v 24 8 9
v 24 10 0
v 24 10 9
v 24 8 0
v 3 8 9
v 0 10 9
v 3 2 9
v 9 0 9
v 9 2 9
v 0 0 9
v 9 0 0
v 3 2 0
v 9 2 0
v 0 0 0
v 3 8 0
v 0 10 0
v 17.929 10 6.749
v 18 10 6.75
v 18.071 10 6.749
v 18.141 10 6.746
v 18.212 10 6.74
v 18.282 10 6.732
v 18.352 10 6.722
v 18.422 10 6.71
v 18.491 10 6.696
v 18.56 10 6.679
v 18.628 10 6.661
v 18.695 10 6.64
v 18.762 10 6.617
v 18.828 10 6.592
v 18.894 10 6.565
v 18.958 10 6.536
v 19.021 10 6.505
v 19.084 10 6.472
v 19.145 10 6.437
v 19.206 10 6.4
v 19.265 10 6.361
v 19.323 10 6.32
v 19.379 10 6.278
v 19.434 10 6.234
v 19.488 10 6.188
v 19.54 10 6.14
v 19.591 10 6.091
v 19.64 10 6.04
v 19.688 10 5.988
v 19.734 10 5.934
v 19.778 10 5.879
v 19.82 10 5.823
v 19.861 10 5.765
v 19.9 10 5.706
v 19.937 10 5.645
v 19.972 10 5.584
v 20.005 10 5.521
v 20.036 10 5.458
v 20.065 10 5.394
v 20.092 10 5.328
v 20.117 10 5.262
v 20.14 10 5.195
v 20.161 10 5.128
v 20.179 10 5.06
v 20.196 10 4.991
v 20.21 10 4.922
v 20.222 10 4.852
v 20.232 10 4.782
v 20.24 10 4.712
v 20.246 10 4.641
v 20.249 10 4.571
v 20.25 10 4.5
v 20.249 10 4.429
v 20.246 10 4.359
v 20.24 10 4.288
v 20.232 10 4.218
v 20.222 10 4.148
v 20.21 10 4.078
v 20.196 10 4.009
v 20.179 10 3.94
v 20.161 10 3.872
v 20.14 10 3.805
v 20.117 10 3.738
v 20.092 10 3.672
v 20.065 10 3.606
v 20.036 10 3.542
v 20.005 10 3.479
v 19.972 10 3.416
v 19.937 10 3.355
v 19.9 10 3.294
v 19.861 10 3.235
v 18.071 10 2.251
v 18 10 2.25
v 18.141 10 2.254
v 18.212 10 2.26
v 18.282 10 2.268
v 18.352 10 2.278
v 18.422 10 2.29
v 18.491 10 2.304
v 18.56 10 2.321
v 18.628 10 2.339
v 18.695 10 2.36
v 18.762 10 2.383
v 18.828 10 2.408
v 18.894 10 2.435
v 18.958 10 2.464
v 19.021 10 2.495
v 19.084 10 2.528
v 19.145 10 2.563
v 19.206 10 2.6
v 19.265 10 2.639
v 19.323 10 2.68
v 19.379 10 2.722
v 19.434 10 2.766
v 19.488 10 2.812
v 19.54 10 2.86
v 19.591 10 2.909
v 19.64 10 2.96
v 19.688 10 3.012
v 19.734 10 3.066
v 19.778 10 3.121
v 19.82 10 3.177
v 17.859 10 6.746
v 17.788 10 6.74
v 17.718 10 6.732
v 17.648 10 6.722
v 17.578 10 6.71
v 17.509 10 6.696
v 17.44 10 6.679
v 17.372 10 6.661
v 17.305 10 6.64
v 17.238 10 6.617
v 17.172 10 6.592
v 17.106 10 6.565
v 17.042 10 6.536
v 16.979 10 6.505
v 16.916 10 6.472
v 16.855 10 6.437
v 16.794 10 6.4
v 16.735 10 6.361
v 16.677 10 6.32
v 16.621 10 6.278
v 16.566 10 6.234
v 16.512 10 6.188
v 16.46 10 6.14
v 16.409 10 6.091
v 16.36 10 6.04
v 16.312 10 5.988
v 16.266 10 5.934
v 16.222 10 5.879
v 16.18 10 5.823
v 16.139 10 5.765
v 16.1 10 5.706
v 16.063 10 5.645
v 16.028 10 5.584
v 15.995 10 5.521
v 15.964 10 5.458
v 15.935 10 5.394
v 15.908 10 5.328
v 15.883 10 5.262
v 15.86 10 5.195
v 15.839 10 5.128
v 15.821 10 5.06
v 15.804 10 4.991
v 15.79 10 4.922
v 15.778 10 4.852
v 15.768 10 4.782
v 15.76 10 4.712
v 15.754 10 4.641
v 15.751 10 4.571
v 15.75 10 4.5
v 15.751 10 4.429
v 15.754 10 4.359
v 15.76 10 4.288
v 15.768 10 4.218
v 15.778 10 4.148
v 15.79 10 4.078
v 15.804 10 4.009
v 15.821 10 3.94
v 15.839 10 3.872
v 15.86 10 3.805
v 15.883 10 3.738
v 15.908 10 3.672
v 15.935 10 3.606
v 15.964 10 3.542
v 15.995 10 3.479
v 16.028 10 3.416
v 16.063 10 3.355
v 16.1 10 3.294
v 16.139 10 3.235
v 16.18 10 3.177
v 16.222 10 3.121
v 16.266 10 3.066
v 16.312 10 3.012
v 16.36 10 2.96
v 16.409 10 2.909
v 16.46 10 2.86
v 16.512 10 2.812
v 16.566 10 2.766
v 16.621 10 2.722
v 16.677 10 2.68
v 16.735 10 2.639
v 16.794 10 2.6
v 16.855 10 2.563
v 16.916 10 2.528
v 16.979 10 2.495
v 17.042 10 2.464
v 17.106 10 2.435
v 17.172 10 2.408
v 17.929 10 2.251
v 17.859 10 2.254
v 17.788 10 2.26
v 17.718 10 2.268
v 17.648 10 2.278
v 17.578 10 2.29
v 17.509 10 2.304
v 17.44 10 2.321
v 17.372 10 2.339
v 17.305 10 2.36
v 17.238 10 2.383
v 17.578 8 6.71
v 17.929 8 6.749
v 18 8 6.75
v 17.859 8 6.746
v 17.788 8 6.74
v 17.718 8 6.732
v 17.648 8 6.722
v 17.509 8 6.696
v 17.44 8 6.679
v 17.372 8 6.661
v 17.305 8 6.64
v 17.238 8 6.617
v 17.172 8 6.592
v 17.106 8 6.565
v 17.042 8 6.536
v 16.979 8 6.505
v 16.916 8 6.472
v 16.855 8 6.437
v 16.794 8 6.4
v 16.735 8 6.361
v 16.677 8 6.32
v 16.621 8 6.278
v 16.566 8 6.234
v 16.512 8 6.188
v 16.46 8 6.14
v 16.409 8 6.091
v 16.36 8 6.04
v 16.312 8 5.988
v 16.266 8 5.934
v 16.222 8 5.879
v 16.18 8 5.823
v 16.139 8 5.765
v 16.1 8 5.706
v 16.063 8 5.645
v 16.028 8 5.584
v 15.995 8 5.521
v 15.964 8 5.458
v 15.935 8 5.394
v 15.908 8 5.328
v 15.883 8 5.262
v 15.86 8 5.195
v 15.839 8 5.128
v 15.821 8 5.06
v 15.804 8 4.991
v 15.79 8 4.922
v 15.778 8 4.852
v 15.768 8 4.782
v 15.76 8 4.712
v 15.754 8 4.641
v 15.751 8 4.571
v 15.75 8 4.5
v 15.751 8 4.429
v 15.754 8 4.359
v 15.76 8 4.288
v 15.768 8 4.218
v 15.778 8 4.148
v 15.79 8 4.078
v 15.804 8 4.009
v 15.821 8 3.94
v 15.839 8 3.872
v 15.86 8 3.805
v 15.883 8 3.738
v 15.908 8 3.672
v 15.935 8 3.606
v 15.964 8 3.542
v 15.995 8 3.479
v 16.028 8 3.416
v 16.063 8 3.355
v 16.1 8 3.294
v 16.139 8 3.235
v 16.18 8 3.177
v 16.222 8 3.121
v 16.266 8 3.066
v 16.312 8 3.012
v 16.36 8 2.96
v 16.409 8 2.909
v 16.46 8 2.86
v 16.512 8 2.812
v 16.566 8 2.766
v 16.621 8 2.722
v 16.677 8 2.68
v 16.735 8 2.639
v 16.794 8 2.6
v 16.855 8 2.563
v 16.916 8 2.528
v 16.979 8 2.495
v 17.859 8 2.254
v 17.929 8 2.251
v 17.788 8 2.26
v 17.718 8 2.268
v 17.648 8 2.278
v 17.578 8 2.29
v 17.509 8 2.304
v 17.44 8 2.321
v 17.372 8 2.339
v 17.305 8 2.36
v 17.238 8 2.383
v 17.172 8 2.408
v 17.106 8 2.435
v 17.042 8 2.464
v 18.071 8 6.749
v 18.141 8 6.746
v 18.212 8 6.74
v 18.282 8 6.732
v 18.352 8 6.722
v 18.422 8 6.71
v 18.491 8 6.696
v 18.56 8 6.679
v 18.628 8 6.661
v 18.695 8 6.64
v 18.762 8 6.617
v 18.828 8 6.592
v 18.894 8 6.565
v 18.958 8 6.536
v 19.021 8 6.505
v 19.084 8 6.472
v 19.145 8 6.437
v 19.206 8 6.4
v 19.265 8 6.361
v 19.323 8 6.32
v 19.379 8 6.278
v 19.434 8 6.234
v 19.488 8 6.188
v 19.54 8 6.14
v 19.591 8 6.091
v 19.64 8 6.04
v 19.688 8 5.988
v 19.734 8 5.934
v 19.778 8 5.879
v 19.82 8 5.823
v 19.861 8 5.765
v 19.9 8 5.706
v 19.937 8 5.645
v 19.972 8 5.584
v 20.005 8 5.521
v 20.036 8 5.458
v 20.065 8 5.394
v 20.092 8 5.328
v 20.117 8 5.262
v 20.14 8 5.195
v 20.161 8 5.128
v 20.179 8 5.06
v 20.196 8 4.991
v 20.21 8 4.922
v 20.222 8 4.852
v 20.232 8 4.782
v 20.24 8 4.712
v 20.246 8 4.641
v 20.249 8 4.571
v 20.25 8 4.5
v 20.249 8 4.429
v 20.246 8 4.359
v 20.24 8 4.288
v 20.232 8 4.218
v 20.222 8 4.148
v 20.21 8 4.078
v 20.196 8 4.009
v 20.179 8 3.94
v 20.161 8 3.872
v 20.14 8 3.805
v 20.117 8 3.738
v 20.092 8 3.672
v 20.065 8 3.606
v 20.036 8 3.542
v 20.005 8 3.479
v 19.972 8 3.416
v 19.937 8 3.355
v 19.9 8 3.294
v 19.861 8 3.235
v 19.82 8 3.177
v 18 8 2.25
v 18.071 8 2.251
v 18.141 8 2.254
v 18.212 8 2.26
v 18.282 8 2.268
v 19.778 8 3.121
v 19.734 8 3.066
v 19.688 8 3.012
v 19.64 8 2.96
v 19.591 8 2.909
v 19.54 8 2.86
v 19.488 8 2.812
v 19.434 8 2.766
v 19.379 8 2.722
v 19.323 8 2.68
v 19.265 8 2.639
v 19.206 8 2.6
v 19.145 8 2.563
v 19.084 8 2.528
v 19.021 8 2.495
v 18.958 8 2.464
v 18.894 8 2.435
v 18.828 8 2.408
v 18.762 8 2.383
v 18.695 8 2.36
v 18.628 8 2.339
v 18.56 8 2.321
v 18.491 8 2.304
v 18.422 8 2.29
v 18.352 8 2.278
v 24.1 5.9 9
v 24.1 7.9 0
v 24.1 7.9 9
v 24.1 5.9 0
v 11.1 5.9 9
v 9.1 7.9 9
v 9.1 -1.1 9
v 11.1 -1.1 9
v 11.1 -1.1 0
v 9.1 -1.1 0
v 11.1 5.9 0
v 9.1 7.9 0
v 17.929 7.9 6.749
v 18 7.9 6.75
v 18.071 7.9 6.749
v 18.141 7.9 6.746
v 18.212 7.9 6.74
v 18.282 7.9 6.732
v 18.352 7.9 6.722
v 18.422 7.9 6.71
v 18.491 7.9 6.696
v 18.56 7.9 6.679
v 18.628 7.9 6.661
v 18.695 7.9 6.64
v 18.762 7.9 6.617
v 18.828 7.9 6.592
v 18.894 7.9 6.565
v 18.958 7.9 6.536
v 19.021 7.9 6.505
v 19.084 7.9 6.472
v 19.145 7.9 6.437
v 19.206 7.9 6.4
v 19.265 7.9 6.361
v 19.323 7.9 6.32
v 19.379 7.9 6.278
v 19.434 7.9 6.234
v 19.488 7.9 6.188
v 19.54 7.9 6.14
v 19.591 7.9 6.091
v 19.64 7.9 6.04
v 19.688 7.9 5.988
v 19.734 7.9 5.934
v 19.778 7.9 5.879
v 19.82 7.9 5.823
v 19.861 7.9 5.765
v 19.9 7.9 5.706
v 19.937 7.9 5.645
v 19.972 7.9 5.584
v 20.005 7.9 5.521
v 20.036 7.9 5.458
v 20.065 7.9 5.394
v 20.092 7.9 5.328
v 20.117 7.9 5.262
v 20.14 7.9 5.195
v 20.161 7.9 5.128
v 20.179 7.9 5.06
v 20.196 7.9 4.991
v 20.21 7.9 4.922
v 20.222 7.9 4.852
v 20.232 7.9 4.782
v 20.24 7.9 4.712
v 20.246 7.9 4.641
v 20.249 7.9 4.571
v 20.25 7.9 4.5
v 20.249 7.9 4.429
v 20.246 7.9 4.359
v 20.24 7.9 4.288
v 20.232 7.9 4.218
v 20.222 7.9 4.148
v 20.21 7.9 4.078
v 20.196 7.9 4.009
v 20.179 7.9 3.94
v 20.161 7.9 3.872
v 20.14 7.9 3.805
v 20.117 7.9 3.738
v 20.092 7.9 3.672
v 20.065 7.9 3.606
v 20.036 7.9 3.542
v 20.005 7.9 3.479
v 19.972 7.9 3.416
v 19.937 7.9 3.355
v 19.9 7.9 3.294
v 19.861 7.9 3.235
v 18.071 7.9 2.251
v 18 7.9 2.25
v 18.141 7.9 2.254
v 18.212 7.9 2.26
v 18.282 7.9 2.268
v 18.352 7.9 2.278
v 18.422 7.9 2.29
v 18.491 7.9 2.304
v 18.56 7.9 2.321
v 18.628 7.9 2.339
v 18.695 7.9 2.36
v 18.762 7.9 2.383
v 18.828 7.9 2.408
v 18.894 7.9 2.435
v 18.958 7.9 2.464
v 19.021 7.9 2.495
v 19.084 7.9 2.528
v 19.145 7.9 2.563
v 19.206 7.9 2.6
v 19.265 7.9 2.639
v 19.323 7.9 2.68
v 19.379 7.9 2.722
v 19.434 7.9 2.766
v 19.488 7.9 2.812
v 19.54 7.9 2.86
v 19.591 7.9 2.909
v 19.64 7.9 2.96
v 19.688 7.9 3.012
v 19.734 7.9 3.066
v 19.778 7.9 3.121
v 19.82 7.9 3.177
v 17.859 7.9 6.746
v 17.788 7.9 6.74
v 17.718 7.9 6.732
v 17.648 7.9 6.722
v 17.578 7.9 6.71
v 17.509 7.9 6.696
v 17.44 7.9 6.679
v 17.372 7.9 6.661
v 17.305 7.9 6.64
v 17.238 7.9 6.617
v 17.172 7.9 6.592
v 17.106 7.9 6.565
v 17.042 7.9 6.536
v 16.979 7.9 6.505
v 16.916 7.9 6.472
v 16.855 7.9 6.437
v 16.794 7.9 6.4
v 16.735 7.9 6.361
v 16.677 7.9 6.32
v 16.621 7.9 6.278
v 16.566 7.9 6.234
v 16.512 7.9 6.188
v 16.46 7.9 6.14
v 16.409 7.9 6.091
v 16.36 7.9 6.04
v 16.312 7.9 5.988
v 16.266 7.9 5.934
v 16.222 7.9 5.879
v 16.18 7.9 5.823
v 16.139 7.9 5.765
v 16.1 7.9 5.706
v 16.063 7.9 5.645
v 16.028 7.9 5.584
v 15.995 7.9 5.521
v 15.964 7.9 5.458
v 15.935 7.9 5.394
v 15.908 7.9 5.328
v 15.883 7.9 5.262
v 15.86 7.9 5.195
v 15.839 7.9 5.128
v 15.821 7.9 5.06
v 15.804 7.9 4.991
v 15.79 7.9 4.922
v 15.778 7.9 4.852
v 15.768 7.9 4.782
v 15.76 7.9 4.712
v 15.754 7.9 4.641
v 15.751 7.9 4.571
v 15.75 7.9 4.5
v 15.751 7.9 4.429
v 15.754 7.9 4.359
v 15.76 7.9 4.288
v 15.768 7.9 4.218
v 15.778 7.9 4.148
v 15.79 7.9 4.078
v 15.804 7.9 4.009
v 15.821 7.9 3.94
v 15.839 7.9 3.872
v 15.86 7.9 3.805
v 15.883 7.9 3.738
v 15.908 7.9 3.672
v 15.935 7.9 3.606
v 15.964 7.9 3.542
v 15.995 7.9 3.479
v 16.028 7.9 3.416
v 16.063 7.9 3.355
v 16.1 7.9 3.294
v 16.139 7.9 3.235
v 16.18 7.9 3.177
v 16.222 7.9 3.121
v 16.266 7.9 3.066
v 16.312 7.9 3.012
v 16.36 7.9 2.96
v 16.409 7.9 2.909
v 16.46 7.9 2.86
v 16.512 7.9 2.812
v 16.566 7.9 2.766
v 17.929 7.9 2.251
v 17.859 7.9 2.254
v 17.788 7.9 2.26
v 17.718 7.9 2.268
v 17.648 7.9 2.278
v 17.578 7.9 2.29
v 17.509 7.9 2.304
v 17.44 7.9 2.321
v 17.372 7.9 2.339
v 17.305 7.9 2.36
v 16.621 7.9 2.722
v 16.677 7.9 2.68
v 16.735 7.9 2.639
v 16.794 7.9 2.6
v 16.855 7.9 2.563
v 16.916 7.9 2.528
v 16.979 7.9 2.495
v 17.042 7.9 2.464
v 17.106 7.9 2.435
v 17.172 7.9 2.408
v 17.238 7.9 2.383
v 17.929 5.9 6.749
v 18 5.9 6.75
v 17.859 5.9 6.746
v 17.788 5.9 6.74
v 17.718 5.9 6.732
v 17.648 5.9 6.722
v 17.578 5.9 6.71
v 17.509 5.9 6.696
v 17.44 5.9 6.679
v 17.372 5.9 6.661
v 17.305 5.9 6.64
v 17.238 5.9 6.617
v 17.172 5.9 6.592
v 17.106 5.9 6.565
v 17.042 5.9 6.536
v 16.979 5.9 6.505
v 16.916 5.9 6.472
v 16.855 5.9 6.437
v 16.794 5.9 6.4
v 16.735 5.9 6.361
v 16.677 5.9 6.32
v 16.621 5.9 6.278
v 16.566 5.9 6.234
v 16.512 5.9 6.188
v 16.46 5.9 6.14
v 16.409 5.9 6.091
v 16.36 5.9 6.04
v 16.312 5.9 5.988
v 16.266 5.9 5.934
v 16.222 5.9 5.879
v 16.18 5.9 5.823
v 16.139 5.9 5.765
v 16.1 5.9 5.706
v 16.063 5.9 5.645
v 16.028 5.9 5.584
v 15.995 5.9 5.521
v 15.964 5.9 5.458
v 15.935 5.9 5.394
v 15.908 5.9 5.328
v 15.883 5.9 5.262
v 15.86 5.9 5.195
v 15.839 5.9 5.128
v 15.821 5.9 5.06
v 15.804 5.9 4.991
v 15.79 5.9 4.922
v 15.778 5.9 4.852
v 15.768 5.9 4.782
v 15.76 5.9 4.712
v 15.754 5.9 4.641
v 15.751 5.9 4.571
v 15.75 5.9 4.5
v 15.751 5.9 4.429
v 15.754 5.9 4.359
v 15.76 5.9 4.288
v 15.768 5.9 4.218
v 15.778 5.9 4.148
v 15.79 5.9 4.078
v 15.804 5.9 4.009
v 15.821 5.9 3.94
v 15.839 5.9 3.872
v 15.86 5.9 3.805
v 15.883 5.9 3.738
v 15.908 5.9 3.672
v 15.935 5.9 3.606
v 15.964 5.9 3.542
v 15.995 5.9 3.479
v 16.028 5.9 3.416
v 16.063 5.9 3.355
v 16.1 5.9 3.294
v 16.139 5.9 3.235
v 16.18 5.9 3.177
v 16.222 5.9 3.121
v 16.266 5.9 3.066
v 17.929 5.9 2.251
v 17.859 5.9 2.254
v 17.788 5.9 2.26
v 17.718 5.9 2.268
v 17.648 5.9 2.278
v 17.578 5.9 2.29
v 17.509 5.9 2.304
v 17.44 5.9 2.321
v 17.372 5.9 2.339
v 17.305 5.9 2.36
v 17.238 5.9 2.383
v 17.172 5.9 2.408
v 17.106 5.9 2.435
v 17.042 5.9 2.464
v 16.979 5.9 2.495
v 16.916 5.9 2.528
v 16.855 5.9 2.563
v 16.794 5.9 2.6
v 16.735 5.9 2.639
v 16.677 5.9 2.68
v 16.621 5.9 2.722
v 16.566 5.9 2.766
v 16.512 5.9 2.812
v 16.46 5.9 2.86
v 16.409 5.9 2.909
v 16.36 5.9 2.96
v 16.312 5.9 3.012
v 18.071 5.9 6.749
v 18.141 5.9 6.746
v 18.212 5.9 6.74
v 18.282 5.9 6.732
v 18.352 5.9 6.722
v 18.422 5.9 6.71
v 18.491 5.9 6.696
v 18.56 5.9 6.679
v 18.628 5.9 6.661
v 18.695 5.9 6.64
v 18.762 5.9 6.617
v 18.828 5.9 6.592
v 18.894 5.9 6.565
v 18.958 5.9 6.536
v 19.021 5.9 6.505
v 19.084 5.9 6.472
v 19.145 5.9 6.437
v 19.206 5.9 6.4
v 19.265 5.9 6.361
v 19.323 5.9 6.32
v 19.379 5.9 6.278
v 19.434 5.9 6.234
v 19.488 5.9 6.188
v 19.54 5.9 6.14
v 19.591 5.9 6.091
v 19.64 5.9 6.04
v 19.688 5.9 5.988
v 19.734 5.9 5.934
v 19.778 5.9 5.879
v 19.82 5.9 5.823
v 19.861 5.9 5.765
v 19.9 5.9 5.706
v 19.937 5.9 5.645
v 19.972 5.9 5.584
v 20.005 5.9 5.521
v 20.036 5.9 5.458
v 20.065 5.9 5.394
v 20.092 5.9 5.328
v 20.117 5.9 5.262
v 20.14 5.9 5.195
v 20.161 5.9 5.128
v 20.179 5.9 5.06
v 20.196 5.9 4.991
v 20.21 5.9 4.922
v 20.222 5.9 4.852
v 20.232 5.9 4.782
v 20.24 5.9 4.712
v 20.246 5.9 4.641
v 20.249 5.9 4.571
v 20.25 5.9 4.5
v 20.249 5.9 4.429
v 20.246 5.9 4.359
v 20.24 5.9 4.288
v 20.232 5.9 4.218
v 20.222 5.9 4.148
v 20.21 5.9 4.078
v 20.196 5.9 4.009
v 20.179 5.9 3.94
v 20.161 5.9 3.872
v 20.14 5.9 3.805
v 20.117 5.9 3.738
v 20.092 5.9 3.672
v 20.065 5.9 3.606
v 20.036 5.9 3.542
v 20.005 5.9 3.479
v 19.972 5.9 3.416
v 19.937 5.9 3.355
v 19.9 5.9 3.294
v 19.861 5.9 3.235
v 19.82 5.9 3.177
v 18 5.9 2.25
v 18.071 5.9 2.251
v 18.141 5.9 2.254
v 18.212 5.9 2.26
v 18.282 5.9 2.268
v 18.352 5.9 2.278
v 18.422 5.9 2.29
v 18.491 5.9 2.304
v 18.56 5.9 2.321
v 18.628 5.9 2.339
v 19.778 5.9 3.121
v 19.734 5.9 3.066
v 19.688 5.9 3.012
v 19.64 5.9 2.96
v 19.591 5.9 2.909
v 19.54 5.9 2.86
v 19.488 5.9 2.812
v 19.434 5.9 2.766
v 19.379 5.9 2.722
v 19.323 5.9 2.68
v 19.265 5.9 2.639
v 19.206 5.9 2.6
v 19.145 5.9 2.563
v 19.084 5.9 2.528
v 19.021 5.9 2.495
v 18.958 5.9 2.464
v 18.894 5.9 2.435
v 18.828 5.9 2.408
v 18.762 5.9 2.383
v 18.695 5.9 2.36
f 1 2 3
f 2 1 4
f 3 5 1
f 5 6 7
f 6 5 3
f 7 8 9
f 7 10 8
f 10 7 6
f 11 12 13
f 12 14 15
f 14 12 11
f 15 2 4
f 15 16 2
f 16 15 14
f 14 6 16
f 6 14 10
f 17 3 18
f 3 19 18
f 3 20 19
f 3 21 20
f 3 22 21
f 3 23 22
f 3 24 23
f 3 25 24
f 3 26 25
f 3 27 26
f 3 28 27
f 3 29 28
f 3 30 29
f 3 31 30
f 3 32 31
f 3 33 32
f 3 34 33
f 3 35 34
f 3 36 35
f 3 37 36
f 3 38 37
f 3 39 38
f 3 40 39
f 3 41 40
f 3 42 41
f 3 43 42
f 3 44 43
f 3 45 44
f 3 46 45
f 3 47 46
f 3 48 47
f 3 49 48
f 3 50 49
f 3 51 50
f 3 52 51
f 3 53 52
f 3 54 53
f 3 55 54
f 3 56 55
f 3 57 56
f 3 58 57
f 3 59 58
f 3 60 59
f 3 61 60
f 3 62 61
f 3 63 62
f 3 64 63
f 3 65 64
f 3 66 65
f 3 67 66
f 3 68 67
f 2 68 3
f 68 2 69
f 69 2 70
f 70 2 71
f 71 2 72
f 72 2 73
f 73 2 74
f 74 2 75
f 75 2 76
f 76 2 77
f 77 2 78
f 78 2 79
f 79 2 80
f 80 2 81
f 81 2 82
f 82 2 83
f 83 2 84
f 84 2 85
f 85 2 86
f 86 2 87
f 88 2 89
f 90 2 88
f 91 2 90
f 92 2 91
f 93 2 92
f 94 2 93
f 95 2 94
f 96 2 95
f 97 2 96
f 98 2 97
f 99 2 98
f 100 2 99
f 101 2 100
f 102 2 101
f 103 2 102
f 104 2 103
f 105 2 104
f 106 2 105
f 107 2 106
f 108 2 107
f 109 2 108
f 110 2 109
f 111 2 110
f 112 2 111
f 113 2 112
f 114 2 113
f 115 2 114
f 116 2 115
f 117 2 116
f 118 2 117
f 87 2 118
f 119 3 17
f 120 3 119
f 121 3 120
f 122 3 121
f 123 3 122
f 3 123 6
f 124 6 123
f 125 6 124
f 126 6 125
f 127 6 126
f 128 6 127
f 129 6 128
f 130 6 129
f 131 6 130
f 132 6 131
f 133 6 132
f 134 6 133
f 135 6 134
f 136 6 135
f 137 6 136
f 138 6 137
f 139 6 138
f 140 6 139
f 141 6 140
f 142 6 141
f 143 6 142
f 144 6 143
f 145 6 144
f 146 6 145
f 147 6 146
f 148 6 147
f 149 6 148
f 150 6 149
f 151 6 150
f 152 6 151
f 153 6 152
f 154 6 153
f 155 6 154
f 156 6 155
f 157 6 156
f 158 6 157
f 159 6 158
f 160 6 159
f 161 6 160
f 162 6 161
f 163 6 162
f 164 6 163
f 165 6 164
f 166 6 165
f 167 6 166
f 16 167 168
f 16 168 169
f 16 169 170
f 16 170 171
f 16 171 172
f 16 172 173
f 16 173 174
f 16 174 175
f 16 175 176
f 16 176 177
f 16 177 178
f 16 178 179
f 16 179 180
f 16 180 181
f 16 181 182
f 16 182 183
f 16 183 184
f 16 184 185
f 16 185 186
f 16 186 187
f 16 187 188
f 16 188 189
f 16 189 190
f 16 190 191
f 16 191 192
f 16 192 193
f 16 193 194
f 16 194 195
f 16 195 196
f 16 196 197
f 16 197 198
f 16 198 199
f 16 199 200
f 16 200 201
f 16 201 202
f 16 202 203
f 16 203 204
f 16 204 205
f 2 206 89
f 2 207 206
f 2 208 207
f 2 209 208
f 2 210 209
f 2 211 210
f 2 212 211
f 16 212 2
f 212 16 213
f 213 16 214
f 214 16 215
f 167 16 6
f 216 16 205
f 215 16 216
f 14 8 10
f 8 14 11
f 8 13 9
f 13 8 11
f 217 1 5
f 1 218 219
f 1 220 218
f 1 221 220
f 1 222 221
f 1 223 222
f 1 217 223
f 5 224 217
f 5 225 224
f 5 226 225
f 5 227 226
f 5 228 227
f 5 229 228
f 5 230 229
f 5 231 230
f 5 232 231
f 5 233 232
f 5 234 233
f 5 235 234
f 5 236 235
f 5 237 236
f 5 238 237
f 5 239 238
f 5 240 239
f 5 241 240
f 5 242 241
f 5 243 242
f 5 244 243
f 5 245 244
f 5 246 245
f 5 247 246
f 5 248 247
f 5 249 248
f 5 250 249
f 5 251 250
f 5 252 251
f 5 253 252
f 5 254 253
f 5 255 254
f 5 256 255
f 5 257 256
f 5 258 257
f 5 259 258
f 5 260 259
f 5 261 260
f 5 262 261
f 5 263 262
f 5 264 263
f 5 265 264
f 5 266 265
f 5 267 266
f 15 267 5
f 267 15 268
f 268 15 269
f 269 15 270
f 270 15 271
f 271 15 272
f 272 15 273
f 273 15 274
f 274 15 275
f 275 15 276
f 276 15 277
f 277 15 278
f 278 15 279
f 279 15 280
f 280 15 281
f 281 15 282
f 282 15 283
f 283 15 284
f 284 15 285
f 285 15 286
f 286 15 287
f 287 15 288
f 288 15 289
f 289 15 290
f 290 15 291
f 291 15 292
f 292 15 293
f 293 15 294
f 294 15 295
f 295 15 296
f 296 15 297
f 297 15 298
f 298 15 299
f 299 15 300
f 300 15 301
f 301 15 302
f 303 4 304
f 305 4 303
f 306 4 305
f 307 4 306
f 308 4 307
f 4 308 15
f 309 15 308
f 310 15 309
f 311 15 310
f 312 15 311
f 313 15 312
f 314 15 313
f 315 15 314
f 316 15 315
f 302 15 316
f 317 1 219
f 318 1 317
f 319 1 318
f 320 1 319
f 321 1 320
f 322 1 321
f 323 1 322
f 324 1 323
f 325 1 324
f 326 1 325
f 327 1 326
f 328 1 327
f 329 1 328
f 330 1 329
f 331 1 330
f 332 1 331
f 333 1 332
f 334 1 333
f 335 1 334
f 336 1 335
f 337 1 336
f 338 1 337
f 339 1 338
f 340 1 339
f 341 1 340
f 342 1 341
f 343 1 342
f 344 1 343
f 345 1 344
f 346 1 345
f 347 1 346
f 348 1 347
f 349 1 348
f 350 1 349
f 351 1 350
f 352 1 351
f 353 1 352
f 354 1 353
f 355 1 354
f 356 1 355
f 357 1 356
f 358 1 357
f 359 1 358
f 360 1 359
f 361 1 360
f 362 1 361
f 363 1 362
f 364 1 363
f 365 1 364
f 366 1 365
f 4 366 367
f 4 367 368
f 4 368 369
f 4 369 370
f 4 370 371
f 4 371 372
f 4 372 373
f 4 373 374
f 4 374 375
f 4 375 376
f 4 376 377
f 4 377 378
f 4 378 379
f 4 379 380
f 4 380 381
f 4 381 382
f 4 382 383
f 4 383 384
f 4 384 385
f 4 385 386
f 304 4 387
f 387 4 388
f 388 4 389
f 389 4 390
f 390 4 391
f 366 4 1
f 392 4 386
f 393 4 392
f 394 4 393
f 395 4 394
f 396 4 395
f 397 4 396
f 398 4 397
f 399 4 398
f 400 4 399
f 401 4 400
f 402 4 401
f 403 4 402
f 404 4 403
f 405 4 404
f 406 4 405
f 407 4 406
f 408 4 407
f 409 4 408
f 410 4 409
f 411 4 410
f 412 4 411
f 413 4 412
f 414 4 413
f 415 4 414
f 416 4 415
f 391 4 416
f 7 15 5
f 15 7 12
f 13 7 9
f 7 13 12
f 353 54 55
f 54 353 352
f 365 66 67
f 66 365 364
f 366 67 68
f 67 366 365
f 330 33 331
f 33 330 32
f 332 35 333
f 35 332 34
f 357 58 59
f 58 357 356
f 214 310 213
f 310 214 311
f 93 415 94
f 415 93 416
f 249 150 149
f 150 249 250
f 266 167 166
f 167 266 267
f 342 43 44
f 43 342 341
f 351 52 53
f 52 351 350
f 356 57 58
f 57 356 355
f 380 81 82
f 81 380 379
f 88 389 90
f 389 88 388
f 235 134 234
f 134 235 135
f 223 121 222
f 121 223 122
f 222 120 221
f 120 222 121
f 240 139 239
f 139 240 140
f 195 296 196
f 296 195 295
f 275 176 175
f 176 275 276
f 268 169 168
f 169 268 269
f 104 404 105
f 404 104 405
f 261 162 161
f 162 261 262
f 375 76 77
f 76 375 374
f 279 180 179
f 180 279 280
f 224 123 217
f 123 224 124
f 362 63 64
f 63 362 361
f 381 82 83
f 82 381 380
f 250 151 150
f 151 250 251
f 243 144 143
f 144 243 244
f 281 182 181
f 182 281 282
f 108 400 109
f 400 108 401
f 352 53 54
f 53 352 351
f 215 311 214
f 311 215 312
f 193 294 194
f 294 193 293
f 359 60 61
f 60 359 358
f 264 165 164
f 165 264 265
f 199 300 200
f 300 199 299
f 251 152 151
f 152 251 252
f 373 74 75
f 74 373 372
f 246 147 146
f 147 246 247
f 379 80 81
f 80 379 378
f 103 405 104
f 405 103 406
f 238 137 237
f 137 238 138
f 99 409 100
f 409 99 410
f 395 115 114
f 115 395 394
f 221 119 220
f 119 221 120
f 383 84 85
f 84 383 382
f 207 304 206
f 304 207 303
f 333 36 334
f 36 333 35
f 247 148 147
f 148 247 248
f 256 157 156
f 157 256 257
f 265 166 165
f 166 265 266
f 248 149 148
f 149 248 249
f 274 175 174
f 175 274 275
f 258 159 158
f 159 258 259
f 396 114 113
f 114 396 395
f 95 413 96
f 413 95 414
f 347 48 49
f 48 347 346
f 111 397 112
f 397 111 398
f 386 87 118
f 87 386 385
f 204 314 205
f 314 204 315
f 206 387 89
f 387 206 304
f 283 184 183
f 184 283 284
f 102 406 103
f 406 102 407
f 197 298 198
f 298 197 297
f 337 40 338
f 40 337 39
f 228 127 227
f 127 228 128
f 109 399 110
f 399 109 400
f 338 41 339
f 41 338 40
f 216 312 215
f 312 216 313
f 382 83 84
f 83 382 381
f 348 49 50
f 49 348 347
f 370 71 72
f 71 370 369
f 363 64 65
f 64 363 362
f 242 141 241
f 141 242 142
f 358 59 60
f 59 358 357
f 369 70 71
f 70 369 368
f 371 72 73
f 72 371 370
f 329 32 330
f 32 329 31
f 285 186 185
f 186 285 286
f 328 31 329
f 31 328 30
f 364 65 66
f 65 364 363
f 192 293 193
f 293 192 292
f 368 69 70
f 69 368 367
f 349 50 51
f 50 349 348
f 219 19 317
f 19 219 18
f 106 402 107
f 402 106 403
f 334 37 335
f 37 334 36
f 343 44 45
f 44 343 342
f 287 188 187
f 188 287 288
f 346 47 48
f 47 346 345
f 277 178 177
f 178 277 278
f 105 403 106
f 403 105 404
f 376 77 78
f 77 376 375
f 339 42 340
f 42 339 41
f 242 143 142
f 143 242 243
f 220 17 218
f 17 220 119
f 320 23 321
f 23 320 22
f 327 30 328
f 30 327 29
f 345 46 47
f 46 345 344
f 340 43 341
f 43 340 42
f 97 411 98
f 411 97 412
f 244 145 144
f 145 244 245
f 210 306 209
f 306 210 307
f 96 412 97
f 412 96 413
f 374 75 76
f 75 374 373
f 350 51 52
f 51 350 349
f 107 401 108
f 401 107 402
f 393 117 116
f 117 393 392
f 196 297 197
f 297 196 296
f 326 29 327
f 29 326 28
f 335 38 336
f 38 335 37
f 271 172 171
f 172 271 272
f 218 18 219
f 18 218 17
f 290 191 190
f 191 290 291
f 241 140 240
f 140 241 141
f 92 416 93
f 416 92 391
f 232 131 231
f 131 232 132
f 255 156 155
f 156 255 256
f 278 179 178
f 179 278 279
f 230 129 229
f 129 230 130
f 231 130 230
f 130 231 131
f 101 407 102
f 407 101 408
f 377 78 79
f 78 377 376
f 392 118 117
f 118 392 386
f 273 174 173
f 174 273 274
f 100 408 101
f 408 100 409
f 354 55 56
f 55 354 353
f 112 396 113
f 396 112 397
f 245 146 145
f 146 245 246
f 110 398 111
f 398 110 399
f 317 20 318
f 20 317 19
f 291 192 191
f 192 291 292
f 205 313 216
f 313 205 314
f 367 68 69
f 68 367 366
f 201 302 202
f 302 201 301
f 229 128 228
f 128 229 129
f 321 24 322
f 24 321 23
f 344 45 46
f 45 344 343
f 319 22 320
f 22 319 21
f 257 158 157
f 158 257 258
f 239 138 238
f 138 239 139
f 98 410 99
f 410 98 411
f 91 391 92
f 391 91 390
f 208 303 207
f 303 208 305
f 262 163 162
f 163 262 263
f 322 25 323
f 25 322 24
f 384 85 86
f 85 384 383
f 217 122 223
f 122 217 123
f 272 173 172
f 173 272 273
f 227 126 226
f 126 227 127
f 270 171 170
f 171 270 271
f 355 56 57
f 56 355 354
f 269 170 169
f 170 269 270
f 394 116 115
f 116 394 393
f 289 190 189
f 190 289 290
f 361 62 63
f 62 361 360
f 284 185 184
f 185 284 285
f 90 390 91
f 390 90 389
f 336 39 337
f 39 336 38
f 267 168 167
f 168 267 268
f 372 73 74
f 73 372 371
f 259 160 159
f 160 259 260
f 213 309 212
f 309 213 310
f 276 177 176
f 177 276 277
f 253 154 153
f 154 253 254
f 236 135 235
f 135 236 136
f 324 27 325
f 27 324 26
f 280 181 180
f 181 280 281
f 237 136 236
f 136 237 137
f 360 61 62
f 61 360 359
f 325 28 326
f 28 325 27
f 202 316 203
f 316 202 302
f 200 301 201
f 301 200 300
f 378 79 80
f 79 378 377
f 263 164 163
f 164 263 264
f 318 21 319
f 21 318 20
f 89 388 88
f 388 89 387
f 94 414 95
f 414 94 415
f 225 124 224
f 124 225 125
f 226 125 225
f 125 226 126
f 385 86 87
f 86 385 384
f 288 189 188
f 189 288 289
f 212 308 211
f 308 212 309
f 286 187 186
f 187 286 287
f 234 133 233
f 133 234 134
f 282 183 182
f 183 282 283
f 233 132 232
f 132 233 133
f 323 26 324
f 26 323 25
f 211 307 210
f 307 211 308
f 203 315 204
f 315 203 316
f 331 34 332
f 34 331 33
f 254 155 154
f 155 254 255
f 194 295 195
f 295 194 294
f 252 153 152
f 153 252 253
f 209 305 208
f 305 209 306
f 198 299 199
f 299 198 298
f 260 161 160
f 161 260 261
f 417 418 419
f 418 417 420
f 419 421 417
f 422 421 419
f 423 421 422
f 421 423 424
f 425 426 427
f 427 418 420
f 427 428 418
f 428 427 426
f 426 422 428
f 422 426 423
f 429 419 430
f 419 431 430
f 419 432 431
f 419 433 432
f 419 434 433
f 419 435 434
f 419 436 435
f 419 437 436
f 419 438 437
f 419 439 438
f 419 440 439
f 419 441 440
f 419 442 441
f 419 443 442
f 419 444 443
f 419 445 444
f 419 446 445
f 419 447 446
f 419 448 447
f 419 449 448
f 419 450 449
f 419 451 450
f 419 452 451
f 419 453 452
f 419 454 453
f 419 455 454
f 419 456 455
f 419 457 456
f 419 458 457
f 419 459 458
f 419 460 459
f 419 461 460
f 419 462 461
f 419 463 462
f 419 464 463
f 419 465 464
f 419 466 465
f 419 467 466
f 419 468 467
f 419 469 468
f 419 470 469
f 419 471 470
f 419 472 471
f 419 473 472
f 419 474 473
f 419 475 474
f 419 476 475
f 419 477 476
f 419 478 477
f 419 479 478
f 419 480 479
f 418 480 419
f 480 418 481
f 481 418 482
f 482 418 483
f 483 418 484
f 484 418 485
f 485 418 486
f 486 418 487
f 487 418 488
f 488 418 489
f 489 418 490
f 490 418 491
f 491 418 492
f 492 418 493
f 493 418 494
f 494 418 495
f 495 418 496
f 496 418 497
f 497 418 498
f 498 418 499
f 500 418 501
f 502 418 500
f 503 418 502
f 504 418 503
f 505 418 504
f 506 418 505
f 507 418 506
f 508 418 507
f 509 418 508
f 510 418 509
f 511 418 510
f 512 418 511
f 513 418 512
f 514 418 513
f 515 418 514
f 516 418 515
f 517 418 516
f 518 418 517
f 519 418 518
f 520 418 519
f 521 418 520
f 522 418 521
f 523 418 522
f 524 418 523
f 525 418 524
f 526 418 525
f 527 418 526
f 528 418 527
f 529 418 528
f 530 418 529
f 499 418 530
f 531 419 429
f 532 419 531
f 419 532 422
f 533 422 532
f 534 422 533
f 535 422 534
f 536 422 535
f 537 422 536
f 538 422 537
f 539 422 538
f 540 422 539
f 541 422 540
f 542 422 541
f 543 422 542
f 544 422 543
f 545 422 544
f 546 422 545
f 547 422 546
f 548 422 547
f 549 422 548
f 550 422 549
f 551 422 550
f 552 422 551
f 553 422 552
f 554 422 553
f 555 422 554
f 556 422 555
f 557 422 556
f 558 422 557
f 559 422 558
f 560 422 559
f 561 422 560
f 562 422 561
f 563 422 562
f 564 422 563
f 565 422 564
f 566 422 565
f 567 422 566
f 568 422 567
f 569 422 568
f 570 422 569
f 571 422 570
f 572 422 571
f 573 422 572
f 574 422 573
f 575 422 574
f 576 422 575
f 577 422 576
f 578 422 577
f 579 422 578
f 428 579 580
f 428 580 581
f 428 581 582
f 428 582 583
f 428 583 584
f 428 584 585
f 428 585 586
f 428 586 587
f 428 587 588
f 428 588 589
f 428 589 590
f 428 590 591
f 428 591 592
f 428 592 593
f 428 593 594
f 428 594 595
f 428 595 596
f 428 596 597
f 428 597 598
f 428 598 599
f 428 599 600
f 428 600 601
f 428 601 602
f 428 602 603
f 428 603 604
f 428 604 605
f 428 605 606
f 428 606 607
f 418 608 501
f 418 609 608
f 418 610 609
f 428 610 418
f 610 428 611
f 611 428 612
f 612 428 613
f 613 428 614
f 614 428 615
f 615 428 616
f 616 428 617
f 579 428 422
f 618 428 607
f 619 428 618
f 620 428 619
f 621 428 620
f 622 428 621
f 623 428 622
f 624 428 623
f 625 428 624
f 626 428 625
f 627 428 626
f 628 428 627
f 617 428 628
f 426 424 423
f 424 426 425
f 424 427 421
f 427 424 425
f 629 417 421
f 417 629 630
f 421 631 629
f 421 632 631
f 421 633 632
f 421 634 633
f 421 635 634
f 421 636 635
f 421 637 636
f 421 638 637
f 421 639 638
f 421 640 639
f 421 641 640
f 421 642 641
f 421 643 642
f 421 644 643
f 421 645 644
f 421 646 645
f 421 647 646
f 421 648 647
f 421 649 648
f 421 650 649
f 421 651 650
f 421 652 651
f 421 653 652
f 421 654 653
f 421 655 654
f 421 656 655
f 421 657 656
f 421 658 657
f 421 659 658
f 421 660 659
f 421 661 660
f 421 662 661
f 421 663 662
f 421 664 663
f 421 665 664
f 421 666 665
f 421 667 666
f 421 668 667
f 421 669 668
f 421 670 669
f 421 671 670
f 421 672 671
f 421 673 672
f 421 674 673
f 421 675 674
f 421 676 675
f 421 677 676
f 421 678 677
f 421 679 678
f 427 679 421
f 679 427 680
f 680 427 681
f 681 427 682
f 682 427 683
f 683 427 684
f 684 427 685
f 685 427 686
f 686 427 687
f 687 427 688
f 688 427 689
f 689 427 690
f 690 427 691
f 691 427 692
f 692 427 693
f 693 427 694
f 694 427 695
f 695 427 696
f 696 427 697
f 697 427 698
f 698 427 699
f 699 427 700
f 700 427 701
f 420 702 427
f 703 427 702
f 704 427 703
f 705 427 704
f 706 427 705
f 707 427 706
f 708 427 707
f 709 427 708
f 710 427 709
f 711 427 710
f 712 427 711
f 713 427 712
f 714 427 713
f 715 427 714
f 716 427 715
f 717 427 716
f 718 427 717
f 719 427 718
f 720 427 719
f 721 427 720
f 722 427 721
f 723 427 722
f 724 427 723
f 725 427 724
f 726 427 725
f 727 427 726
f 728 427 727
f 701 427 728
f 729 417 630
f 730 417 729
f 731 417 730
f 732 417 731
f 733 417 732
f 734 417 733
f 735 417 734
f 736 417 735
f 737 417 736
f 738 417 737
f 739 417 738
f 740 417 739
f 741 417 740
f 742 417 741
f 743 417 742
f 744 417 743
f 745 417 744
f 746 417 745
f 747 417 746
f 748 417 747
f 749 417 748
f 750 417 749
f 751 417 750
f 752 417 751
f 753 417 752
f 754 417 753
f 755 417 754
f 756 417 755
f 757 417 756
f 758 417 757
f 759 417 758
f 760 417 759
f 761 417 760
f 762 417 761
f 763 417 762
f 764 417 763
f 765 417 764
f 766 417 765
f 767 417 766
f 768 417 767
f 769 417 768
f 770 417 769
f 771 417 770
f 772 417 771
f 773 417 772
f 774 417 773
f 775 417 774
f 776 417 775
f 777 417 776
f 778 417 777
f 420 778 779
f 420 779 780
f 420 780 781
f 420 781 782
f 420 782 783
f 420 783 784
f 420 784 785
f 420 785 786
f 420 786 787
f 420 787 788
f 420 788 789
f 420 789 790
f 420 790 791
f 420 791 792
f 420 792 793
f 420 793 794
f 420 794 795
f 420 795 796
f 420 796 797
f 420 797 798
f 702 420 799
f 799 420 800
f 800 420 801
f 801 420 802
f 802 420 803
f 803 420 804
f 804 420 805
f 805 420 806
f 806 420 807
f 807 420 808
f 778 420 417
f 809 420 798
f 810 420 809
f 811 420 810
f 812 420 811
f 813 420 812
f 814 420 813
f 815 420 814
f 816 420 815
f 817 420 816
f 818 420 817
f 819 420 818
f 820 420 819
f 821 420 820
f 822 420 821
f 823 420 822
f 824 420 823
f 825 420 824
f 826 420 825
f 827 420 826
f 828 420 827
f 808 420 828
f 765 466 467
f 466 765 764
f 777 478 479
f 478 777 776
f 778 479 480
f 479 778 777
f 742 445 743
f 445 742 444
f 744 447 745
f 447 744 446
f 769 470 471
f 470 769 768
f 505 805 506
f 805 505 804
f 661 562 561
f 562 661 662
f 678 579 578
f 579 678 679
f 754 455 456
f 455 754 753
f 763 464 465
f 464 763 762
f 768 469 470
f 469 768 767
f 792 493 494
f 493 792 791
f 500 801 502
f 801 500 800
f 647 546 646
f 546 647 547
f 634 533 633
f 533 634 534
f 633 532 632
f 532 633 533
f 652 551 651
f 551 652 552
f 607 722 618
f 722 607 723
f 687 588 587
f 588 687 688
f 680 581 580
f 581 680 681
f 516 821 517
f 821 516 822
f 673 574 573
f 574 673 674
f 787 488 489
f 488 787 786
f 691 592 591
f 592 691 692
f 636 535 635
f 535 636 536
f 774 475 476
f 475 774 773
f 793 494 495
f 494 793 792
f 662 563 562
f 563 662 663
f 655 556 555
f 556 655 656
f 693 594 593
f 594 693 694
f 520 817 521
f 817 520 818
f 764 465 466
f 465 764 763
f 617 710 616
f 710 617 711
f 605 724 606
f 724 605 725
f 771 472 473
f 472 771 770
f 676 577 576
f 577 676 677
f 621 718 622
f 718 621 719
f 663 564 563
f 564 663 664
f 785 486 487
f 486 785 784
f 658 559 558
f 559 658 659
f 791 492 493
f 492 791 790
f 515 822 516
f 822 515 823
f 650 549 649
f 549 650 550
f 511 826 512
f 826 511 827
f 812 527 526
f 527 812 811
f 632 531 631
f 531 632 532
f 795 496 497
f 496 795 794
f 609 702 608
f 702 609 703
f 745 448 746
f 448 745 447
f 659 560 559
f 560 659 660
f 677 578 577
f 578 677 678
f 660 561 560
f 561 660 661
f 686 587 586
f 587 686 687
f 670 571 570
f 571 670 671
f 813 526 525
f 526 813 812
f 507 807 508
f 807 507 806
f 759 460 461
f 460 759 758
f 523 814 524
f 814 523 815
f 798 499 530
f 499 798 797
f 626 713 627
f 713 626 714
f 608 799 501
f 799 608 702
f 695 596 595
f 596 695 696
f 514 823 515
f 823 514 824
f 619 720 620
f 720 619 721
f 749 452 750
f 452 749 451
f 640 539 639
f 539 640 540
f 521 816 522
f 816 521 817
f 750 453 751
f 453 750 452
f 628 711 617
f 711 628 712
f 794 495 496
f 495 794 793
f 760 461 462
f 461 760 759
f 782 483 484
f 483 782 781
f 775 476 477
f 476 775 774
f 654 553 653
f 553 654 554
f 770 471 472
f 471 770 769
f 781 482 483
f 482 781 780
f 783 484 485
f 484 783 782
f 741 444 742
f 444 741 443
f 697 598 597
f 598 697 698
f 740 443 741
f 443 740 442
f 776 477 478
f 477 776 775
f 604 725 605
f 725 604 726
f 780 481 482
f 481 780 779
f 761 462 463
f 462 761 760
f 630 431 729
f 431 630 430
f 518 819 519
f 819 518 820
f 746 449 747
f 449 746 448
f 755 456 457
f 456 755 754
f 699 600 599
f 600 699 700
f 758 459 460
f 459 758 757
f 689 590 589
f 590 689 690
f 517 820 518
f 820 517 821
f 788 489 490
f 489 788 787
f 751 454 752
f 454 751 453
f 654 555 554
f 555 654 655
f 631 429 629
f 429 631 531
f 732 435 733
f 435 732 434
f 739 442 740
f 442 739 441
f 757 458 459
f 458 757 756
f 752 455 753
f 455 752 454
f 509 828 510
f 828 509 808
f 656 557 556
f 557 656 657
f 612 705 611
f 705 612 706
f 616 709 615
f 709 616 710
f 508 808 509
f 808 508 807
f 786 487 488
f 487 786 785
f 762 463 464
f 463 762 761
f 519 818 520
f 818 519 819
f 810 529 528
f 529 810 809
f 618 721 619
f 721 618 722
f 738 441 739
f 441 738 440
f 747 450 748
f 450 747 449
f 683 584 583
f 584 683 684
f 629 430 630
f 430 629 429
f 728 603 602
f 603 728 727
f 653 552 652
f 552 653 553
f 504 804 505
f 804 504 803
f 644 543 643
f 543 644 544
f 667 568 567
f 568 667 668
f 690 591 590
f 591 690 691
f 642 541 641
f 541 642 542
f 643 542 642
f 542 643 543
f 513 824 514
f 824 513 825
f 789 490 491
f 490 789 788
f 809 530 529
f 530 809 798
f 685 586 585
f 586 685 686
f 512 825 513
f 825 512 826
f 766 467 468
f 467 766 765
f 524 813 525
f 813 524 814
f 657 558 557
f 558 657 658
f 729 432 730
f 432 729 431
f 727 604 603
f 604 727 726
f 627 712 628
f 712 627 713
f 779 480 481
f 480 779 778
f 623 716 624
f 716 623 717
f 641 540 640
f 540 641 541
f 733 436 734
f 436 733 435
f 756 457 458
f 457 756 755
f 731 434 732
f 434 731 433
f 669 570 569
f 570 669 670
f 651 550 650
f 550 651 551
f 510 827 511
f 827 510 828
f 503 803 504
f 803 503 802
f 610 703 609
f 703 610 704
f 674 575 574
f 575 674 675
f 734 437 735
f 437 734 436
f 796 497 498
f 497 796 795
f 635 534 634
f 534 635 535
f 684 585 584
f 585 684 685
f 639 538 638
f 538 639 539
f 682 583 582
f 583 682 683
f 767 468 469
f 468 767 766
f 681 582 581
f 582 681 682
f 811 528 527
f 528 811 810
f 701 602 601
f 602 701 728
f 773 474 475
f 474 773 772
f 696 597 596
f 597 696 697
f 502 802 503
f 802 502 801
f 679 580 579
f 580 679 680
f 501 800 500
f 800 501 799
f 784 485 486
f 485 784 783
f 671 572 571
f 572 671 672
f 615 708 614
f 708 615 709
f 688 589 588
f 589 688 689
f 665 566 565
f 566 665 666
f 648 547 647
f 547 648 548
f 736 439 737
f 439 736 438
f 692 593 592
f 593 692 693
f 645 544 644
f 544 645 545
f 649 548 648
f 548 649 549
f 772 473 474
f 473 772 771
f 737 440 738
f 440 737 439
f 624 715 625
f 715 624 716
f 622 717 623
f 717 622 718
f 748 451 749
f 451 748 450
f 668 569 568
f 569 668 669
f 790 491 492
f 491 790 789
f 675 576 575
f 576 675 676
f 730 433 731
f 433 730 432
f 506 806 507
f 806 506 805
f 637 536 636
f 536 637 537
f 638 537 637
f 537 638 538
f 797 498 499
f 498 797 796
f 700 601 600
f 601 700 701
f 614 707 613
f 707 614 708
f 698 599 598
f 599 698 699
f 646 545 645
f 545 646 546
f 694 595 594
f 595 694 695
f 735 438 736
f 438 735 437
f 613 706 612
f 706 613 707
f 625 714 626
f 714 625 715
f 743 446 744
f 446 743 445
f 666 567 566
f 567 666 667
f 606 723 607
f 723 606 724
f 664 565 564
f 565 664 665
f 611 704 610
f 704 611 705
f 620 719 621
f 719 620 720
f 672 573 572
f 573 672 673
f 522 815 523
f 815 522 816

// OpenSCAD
$fn=200;

// hookType01

hookType01();
hookType01Lock();

module hookType01()
{
    difference()
    {
        cube([24,10,9]);
        translate([9,-1,-1])
        {
            cube([16,9,11]);
        }
        translate([3,2,-1])
        {
            cube([7,6,11]);
        }
        hookType01Hole();
    }
}
module hookType01Lock()
{
   difference()
    {
        translate([9.1,-1.1,0])
        {
            cube([15,9,9]);
        }
        translate([11.1,-2.1,-1])
        {
            cube([15,8,11]);
        }
        hookType01Hole();
    }
}

module hookType01Hole()
{
    rotate([90,0,0])
    {
        translate([18,4.5,-11])
        {
            cylinder(d=4.5,h=12);
        }
    }
}
